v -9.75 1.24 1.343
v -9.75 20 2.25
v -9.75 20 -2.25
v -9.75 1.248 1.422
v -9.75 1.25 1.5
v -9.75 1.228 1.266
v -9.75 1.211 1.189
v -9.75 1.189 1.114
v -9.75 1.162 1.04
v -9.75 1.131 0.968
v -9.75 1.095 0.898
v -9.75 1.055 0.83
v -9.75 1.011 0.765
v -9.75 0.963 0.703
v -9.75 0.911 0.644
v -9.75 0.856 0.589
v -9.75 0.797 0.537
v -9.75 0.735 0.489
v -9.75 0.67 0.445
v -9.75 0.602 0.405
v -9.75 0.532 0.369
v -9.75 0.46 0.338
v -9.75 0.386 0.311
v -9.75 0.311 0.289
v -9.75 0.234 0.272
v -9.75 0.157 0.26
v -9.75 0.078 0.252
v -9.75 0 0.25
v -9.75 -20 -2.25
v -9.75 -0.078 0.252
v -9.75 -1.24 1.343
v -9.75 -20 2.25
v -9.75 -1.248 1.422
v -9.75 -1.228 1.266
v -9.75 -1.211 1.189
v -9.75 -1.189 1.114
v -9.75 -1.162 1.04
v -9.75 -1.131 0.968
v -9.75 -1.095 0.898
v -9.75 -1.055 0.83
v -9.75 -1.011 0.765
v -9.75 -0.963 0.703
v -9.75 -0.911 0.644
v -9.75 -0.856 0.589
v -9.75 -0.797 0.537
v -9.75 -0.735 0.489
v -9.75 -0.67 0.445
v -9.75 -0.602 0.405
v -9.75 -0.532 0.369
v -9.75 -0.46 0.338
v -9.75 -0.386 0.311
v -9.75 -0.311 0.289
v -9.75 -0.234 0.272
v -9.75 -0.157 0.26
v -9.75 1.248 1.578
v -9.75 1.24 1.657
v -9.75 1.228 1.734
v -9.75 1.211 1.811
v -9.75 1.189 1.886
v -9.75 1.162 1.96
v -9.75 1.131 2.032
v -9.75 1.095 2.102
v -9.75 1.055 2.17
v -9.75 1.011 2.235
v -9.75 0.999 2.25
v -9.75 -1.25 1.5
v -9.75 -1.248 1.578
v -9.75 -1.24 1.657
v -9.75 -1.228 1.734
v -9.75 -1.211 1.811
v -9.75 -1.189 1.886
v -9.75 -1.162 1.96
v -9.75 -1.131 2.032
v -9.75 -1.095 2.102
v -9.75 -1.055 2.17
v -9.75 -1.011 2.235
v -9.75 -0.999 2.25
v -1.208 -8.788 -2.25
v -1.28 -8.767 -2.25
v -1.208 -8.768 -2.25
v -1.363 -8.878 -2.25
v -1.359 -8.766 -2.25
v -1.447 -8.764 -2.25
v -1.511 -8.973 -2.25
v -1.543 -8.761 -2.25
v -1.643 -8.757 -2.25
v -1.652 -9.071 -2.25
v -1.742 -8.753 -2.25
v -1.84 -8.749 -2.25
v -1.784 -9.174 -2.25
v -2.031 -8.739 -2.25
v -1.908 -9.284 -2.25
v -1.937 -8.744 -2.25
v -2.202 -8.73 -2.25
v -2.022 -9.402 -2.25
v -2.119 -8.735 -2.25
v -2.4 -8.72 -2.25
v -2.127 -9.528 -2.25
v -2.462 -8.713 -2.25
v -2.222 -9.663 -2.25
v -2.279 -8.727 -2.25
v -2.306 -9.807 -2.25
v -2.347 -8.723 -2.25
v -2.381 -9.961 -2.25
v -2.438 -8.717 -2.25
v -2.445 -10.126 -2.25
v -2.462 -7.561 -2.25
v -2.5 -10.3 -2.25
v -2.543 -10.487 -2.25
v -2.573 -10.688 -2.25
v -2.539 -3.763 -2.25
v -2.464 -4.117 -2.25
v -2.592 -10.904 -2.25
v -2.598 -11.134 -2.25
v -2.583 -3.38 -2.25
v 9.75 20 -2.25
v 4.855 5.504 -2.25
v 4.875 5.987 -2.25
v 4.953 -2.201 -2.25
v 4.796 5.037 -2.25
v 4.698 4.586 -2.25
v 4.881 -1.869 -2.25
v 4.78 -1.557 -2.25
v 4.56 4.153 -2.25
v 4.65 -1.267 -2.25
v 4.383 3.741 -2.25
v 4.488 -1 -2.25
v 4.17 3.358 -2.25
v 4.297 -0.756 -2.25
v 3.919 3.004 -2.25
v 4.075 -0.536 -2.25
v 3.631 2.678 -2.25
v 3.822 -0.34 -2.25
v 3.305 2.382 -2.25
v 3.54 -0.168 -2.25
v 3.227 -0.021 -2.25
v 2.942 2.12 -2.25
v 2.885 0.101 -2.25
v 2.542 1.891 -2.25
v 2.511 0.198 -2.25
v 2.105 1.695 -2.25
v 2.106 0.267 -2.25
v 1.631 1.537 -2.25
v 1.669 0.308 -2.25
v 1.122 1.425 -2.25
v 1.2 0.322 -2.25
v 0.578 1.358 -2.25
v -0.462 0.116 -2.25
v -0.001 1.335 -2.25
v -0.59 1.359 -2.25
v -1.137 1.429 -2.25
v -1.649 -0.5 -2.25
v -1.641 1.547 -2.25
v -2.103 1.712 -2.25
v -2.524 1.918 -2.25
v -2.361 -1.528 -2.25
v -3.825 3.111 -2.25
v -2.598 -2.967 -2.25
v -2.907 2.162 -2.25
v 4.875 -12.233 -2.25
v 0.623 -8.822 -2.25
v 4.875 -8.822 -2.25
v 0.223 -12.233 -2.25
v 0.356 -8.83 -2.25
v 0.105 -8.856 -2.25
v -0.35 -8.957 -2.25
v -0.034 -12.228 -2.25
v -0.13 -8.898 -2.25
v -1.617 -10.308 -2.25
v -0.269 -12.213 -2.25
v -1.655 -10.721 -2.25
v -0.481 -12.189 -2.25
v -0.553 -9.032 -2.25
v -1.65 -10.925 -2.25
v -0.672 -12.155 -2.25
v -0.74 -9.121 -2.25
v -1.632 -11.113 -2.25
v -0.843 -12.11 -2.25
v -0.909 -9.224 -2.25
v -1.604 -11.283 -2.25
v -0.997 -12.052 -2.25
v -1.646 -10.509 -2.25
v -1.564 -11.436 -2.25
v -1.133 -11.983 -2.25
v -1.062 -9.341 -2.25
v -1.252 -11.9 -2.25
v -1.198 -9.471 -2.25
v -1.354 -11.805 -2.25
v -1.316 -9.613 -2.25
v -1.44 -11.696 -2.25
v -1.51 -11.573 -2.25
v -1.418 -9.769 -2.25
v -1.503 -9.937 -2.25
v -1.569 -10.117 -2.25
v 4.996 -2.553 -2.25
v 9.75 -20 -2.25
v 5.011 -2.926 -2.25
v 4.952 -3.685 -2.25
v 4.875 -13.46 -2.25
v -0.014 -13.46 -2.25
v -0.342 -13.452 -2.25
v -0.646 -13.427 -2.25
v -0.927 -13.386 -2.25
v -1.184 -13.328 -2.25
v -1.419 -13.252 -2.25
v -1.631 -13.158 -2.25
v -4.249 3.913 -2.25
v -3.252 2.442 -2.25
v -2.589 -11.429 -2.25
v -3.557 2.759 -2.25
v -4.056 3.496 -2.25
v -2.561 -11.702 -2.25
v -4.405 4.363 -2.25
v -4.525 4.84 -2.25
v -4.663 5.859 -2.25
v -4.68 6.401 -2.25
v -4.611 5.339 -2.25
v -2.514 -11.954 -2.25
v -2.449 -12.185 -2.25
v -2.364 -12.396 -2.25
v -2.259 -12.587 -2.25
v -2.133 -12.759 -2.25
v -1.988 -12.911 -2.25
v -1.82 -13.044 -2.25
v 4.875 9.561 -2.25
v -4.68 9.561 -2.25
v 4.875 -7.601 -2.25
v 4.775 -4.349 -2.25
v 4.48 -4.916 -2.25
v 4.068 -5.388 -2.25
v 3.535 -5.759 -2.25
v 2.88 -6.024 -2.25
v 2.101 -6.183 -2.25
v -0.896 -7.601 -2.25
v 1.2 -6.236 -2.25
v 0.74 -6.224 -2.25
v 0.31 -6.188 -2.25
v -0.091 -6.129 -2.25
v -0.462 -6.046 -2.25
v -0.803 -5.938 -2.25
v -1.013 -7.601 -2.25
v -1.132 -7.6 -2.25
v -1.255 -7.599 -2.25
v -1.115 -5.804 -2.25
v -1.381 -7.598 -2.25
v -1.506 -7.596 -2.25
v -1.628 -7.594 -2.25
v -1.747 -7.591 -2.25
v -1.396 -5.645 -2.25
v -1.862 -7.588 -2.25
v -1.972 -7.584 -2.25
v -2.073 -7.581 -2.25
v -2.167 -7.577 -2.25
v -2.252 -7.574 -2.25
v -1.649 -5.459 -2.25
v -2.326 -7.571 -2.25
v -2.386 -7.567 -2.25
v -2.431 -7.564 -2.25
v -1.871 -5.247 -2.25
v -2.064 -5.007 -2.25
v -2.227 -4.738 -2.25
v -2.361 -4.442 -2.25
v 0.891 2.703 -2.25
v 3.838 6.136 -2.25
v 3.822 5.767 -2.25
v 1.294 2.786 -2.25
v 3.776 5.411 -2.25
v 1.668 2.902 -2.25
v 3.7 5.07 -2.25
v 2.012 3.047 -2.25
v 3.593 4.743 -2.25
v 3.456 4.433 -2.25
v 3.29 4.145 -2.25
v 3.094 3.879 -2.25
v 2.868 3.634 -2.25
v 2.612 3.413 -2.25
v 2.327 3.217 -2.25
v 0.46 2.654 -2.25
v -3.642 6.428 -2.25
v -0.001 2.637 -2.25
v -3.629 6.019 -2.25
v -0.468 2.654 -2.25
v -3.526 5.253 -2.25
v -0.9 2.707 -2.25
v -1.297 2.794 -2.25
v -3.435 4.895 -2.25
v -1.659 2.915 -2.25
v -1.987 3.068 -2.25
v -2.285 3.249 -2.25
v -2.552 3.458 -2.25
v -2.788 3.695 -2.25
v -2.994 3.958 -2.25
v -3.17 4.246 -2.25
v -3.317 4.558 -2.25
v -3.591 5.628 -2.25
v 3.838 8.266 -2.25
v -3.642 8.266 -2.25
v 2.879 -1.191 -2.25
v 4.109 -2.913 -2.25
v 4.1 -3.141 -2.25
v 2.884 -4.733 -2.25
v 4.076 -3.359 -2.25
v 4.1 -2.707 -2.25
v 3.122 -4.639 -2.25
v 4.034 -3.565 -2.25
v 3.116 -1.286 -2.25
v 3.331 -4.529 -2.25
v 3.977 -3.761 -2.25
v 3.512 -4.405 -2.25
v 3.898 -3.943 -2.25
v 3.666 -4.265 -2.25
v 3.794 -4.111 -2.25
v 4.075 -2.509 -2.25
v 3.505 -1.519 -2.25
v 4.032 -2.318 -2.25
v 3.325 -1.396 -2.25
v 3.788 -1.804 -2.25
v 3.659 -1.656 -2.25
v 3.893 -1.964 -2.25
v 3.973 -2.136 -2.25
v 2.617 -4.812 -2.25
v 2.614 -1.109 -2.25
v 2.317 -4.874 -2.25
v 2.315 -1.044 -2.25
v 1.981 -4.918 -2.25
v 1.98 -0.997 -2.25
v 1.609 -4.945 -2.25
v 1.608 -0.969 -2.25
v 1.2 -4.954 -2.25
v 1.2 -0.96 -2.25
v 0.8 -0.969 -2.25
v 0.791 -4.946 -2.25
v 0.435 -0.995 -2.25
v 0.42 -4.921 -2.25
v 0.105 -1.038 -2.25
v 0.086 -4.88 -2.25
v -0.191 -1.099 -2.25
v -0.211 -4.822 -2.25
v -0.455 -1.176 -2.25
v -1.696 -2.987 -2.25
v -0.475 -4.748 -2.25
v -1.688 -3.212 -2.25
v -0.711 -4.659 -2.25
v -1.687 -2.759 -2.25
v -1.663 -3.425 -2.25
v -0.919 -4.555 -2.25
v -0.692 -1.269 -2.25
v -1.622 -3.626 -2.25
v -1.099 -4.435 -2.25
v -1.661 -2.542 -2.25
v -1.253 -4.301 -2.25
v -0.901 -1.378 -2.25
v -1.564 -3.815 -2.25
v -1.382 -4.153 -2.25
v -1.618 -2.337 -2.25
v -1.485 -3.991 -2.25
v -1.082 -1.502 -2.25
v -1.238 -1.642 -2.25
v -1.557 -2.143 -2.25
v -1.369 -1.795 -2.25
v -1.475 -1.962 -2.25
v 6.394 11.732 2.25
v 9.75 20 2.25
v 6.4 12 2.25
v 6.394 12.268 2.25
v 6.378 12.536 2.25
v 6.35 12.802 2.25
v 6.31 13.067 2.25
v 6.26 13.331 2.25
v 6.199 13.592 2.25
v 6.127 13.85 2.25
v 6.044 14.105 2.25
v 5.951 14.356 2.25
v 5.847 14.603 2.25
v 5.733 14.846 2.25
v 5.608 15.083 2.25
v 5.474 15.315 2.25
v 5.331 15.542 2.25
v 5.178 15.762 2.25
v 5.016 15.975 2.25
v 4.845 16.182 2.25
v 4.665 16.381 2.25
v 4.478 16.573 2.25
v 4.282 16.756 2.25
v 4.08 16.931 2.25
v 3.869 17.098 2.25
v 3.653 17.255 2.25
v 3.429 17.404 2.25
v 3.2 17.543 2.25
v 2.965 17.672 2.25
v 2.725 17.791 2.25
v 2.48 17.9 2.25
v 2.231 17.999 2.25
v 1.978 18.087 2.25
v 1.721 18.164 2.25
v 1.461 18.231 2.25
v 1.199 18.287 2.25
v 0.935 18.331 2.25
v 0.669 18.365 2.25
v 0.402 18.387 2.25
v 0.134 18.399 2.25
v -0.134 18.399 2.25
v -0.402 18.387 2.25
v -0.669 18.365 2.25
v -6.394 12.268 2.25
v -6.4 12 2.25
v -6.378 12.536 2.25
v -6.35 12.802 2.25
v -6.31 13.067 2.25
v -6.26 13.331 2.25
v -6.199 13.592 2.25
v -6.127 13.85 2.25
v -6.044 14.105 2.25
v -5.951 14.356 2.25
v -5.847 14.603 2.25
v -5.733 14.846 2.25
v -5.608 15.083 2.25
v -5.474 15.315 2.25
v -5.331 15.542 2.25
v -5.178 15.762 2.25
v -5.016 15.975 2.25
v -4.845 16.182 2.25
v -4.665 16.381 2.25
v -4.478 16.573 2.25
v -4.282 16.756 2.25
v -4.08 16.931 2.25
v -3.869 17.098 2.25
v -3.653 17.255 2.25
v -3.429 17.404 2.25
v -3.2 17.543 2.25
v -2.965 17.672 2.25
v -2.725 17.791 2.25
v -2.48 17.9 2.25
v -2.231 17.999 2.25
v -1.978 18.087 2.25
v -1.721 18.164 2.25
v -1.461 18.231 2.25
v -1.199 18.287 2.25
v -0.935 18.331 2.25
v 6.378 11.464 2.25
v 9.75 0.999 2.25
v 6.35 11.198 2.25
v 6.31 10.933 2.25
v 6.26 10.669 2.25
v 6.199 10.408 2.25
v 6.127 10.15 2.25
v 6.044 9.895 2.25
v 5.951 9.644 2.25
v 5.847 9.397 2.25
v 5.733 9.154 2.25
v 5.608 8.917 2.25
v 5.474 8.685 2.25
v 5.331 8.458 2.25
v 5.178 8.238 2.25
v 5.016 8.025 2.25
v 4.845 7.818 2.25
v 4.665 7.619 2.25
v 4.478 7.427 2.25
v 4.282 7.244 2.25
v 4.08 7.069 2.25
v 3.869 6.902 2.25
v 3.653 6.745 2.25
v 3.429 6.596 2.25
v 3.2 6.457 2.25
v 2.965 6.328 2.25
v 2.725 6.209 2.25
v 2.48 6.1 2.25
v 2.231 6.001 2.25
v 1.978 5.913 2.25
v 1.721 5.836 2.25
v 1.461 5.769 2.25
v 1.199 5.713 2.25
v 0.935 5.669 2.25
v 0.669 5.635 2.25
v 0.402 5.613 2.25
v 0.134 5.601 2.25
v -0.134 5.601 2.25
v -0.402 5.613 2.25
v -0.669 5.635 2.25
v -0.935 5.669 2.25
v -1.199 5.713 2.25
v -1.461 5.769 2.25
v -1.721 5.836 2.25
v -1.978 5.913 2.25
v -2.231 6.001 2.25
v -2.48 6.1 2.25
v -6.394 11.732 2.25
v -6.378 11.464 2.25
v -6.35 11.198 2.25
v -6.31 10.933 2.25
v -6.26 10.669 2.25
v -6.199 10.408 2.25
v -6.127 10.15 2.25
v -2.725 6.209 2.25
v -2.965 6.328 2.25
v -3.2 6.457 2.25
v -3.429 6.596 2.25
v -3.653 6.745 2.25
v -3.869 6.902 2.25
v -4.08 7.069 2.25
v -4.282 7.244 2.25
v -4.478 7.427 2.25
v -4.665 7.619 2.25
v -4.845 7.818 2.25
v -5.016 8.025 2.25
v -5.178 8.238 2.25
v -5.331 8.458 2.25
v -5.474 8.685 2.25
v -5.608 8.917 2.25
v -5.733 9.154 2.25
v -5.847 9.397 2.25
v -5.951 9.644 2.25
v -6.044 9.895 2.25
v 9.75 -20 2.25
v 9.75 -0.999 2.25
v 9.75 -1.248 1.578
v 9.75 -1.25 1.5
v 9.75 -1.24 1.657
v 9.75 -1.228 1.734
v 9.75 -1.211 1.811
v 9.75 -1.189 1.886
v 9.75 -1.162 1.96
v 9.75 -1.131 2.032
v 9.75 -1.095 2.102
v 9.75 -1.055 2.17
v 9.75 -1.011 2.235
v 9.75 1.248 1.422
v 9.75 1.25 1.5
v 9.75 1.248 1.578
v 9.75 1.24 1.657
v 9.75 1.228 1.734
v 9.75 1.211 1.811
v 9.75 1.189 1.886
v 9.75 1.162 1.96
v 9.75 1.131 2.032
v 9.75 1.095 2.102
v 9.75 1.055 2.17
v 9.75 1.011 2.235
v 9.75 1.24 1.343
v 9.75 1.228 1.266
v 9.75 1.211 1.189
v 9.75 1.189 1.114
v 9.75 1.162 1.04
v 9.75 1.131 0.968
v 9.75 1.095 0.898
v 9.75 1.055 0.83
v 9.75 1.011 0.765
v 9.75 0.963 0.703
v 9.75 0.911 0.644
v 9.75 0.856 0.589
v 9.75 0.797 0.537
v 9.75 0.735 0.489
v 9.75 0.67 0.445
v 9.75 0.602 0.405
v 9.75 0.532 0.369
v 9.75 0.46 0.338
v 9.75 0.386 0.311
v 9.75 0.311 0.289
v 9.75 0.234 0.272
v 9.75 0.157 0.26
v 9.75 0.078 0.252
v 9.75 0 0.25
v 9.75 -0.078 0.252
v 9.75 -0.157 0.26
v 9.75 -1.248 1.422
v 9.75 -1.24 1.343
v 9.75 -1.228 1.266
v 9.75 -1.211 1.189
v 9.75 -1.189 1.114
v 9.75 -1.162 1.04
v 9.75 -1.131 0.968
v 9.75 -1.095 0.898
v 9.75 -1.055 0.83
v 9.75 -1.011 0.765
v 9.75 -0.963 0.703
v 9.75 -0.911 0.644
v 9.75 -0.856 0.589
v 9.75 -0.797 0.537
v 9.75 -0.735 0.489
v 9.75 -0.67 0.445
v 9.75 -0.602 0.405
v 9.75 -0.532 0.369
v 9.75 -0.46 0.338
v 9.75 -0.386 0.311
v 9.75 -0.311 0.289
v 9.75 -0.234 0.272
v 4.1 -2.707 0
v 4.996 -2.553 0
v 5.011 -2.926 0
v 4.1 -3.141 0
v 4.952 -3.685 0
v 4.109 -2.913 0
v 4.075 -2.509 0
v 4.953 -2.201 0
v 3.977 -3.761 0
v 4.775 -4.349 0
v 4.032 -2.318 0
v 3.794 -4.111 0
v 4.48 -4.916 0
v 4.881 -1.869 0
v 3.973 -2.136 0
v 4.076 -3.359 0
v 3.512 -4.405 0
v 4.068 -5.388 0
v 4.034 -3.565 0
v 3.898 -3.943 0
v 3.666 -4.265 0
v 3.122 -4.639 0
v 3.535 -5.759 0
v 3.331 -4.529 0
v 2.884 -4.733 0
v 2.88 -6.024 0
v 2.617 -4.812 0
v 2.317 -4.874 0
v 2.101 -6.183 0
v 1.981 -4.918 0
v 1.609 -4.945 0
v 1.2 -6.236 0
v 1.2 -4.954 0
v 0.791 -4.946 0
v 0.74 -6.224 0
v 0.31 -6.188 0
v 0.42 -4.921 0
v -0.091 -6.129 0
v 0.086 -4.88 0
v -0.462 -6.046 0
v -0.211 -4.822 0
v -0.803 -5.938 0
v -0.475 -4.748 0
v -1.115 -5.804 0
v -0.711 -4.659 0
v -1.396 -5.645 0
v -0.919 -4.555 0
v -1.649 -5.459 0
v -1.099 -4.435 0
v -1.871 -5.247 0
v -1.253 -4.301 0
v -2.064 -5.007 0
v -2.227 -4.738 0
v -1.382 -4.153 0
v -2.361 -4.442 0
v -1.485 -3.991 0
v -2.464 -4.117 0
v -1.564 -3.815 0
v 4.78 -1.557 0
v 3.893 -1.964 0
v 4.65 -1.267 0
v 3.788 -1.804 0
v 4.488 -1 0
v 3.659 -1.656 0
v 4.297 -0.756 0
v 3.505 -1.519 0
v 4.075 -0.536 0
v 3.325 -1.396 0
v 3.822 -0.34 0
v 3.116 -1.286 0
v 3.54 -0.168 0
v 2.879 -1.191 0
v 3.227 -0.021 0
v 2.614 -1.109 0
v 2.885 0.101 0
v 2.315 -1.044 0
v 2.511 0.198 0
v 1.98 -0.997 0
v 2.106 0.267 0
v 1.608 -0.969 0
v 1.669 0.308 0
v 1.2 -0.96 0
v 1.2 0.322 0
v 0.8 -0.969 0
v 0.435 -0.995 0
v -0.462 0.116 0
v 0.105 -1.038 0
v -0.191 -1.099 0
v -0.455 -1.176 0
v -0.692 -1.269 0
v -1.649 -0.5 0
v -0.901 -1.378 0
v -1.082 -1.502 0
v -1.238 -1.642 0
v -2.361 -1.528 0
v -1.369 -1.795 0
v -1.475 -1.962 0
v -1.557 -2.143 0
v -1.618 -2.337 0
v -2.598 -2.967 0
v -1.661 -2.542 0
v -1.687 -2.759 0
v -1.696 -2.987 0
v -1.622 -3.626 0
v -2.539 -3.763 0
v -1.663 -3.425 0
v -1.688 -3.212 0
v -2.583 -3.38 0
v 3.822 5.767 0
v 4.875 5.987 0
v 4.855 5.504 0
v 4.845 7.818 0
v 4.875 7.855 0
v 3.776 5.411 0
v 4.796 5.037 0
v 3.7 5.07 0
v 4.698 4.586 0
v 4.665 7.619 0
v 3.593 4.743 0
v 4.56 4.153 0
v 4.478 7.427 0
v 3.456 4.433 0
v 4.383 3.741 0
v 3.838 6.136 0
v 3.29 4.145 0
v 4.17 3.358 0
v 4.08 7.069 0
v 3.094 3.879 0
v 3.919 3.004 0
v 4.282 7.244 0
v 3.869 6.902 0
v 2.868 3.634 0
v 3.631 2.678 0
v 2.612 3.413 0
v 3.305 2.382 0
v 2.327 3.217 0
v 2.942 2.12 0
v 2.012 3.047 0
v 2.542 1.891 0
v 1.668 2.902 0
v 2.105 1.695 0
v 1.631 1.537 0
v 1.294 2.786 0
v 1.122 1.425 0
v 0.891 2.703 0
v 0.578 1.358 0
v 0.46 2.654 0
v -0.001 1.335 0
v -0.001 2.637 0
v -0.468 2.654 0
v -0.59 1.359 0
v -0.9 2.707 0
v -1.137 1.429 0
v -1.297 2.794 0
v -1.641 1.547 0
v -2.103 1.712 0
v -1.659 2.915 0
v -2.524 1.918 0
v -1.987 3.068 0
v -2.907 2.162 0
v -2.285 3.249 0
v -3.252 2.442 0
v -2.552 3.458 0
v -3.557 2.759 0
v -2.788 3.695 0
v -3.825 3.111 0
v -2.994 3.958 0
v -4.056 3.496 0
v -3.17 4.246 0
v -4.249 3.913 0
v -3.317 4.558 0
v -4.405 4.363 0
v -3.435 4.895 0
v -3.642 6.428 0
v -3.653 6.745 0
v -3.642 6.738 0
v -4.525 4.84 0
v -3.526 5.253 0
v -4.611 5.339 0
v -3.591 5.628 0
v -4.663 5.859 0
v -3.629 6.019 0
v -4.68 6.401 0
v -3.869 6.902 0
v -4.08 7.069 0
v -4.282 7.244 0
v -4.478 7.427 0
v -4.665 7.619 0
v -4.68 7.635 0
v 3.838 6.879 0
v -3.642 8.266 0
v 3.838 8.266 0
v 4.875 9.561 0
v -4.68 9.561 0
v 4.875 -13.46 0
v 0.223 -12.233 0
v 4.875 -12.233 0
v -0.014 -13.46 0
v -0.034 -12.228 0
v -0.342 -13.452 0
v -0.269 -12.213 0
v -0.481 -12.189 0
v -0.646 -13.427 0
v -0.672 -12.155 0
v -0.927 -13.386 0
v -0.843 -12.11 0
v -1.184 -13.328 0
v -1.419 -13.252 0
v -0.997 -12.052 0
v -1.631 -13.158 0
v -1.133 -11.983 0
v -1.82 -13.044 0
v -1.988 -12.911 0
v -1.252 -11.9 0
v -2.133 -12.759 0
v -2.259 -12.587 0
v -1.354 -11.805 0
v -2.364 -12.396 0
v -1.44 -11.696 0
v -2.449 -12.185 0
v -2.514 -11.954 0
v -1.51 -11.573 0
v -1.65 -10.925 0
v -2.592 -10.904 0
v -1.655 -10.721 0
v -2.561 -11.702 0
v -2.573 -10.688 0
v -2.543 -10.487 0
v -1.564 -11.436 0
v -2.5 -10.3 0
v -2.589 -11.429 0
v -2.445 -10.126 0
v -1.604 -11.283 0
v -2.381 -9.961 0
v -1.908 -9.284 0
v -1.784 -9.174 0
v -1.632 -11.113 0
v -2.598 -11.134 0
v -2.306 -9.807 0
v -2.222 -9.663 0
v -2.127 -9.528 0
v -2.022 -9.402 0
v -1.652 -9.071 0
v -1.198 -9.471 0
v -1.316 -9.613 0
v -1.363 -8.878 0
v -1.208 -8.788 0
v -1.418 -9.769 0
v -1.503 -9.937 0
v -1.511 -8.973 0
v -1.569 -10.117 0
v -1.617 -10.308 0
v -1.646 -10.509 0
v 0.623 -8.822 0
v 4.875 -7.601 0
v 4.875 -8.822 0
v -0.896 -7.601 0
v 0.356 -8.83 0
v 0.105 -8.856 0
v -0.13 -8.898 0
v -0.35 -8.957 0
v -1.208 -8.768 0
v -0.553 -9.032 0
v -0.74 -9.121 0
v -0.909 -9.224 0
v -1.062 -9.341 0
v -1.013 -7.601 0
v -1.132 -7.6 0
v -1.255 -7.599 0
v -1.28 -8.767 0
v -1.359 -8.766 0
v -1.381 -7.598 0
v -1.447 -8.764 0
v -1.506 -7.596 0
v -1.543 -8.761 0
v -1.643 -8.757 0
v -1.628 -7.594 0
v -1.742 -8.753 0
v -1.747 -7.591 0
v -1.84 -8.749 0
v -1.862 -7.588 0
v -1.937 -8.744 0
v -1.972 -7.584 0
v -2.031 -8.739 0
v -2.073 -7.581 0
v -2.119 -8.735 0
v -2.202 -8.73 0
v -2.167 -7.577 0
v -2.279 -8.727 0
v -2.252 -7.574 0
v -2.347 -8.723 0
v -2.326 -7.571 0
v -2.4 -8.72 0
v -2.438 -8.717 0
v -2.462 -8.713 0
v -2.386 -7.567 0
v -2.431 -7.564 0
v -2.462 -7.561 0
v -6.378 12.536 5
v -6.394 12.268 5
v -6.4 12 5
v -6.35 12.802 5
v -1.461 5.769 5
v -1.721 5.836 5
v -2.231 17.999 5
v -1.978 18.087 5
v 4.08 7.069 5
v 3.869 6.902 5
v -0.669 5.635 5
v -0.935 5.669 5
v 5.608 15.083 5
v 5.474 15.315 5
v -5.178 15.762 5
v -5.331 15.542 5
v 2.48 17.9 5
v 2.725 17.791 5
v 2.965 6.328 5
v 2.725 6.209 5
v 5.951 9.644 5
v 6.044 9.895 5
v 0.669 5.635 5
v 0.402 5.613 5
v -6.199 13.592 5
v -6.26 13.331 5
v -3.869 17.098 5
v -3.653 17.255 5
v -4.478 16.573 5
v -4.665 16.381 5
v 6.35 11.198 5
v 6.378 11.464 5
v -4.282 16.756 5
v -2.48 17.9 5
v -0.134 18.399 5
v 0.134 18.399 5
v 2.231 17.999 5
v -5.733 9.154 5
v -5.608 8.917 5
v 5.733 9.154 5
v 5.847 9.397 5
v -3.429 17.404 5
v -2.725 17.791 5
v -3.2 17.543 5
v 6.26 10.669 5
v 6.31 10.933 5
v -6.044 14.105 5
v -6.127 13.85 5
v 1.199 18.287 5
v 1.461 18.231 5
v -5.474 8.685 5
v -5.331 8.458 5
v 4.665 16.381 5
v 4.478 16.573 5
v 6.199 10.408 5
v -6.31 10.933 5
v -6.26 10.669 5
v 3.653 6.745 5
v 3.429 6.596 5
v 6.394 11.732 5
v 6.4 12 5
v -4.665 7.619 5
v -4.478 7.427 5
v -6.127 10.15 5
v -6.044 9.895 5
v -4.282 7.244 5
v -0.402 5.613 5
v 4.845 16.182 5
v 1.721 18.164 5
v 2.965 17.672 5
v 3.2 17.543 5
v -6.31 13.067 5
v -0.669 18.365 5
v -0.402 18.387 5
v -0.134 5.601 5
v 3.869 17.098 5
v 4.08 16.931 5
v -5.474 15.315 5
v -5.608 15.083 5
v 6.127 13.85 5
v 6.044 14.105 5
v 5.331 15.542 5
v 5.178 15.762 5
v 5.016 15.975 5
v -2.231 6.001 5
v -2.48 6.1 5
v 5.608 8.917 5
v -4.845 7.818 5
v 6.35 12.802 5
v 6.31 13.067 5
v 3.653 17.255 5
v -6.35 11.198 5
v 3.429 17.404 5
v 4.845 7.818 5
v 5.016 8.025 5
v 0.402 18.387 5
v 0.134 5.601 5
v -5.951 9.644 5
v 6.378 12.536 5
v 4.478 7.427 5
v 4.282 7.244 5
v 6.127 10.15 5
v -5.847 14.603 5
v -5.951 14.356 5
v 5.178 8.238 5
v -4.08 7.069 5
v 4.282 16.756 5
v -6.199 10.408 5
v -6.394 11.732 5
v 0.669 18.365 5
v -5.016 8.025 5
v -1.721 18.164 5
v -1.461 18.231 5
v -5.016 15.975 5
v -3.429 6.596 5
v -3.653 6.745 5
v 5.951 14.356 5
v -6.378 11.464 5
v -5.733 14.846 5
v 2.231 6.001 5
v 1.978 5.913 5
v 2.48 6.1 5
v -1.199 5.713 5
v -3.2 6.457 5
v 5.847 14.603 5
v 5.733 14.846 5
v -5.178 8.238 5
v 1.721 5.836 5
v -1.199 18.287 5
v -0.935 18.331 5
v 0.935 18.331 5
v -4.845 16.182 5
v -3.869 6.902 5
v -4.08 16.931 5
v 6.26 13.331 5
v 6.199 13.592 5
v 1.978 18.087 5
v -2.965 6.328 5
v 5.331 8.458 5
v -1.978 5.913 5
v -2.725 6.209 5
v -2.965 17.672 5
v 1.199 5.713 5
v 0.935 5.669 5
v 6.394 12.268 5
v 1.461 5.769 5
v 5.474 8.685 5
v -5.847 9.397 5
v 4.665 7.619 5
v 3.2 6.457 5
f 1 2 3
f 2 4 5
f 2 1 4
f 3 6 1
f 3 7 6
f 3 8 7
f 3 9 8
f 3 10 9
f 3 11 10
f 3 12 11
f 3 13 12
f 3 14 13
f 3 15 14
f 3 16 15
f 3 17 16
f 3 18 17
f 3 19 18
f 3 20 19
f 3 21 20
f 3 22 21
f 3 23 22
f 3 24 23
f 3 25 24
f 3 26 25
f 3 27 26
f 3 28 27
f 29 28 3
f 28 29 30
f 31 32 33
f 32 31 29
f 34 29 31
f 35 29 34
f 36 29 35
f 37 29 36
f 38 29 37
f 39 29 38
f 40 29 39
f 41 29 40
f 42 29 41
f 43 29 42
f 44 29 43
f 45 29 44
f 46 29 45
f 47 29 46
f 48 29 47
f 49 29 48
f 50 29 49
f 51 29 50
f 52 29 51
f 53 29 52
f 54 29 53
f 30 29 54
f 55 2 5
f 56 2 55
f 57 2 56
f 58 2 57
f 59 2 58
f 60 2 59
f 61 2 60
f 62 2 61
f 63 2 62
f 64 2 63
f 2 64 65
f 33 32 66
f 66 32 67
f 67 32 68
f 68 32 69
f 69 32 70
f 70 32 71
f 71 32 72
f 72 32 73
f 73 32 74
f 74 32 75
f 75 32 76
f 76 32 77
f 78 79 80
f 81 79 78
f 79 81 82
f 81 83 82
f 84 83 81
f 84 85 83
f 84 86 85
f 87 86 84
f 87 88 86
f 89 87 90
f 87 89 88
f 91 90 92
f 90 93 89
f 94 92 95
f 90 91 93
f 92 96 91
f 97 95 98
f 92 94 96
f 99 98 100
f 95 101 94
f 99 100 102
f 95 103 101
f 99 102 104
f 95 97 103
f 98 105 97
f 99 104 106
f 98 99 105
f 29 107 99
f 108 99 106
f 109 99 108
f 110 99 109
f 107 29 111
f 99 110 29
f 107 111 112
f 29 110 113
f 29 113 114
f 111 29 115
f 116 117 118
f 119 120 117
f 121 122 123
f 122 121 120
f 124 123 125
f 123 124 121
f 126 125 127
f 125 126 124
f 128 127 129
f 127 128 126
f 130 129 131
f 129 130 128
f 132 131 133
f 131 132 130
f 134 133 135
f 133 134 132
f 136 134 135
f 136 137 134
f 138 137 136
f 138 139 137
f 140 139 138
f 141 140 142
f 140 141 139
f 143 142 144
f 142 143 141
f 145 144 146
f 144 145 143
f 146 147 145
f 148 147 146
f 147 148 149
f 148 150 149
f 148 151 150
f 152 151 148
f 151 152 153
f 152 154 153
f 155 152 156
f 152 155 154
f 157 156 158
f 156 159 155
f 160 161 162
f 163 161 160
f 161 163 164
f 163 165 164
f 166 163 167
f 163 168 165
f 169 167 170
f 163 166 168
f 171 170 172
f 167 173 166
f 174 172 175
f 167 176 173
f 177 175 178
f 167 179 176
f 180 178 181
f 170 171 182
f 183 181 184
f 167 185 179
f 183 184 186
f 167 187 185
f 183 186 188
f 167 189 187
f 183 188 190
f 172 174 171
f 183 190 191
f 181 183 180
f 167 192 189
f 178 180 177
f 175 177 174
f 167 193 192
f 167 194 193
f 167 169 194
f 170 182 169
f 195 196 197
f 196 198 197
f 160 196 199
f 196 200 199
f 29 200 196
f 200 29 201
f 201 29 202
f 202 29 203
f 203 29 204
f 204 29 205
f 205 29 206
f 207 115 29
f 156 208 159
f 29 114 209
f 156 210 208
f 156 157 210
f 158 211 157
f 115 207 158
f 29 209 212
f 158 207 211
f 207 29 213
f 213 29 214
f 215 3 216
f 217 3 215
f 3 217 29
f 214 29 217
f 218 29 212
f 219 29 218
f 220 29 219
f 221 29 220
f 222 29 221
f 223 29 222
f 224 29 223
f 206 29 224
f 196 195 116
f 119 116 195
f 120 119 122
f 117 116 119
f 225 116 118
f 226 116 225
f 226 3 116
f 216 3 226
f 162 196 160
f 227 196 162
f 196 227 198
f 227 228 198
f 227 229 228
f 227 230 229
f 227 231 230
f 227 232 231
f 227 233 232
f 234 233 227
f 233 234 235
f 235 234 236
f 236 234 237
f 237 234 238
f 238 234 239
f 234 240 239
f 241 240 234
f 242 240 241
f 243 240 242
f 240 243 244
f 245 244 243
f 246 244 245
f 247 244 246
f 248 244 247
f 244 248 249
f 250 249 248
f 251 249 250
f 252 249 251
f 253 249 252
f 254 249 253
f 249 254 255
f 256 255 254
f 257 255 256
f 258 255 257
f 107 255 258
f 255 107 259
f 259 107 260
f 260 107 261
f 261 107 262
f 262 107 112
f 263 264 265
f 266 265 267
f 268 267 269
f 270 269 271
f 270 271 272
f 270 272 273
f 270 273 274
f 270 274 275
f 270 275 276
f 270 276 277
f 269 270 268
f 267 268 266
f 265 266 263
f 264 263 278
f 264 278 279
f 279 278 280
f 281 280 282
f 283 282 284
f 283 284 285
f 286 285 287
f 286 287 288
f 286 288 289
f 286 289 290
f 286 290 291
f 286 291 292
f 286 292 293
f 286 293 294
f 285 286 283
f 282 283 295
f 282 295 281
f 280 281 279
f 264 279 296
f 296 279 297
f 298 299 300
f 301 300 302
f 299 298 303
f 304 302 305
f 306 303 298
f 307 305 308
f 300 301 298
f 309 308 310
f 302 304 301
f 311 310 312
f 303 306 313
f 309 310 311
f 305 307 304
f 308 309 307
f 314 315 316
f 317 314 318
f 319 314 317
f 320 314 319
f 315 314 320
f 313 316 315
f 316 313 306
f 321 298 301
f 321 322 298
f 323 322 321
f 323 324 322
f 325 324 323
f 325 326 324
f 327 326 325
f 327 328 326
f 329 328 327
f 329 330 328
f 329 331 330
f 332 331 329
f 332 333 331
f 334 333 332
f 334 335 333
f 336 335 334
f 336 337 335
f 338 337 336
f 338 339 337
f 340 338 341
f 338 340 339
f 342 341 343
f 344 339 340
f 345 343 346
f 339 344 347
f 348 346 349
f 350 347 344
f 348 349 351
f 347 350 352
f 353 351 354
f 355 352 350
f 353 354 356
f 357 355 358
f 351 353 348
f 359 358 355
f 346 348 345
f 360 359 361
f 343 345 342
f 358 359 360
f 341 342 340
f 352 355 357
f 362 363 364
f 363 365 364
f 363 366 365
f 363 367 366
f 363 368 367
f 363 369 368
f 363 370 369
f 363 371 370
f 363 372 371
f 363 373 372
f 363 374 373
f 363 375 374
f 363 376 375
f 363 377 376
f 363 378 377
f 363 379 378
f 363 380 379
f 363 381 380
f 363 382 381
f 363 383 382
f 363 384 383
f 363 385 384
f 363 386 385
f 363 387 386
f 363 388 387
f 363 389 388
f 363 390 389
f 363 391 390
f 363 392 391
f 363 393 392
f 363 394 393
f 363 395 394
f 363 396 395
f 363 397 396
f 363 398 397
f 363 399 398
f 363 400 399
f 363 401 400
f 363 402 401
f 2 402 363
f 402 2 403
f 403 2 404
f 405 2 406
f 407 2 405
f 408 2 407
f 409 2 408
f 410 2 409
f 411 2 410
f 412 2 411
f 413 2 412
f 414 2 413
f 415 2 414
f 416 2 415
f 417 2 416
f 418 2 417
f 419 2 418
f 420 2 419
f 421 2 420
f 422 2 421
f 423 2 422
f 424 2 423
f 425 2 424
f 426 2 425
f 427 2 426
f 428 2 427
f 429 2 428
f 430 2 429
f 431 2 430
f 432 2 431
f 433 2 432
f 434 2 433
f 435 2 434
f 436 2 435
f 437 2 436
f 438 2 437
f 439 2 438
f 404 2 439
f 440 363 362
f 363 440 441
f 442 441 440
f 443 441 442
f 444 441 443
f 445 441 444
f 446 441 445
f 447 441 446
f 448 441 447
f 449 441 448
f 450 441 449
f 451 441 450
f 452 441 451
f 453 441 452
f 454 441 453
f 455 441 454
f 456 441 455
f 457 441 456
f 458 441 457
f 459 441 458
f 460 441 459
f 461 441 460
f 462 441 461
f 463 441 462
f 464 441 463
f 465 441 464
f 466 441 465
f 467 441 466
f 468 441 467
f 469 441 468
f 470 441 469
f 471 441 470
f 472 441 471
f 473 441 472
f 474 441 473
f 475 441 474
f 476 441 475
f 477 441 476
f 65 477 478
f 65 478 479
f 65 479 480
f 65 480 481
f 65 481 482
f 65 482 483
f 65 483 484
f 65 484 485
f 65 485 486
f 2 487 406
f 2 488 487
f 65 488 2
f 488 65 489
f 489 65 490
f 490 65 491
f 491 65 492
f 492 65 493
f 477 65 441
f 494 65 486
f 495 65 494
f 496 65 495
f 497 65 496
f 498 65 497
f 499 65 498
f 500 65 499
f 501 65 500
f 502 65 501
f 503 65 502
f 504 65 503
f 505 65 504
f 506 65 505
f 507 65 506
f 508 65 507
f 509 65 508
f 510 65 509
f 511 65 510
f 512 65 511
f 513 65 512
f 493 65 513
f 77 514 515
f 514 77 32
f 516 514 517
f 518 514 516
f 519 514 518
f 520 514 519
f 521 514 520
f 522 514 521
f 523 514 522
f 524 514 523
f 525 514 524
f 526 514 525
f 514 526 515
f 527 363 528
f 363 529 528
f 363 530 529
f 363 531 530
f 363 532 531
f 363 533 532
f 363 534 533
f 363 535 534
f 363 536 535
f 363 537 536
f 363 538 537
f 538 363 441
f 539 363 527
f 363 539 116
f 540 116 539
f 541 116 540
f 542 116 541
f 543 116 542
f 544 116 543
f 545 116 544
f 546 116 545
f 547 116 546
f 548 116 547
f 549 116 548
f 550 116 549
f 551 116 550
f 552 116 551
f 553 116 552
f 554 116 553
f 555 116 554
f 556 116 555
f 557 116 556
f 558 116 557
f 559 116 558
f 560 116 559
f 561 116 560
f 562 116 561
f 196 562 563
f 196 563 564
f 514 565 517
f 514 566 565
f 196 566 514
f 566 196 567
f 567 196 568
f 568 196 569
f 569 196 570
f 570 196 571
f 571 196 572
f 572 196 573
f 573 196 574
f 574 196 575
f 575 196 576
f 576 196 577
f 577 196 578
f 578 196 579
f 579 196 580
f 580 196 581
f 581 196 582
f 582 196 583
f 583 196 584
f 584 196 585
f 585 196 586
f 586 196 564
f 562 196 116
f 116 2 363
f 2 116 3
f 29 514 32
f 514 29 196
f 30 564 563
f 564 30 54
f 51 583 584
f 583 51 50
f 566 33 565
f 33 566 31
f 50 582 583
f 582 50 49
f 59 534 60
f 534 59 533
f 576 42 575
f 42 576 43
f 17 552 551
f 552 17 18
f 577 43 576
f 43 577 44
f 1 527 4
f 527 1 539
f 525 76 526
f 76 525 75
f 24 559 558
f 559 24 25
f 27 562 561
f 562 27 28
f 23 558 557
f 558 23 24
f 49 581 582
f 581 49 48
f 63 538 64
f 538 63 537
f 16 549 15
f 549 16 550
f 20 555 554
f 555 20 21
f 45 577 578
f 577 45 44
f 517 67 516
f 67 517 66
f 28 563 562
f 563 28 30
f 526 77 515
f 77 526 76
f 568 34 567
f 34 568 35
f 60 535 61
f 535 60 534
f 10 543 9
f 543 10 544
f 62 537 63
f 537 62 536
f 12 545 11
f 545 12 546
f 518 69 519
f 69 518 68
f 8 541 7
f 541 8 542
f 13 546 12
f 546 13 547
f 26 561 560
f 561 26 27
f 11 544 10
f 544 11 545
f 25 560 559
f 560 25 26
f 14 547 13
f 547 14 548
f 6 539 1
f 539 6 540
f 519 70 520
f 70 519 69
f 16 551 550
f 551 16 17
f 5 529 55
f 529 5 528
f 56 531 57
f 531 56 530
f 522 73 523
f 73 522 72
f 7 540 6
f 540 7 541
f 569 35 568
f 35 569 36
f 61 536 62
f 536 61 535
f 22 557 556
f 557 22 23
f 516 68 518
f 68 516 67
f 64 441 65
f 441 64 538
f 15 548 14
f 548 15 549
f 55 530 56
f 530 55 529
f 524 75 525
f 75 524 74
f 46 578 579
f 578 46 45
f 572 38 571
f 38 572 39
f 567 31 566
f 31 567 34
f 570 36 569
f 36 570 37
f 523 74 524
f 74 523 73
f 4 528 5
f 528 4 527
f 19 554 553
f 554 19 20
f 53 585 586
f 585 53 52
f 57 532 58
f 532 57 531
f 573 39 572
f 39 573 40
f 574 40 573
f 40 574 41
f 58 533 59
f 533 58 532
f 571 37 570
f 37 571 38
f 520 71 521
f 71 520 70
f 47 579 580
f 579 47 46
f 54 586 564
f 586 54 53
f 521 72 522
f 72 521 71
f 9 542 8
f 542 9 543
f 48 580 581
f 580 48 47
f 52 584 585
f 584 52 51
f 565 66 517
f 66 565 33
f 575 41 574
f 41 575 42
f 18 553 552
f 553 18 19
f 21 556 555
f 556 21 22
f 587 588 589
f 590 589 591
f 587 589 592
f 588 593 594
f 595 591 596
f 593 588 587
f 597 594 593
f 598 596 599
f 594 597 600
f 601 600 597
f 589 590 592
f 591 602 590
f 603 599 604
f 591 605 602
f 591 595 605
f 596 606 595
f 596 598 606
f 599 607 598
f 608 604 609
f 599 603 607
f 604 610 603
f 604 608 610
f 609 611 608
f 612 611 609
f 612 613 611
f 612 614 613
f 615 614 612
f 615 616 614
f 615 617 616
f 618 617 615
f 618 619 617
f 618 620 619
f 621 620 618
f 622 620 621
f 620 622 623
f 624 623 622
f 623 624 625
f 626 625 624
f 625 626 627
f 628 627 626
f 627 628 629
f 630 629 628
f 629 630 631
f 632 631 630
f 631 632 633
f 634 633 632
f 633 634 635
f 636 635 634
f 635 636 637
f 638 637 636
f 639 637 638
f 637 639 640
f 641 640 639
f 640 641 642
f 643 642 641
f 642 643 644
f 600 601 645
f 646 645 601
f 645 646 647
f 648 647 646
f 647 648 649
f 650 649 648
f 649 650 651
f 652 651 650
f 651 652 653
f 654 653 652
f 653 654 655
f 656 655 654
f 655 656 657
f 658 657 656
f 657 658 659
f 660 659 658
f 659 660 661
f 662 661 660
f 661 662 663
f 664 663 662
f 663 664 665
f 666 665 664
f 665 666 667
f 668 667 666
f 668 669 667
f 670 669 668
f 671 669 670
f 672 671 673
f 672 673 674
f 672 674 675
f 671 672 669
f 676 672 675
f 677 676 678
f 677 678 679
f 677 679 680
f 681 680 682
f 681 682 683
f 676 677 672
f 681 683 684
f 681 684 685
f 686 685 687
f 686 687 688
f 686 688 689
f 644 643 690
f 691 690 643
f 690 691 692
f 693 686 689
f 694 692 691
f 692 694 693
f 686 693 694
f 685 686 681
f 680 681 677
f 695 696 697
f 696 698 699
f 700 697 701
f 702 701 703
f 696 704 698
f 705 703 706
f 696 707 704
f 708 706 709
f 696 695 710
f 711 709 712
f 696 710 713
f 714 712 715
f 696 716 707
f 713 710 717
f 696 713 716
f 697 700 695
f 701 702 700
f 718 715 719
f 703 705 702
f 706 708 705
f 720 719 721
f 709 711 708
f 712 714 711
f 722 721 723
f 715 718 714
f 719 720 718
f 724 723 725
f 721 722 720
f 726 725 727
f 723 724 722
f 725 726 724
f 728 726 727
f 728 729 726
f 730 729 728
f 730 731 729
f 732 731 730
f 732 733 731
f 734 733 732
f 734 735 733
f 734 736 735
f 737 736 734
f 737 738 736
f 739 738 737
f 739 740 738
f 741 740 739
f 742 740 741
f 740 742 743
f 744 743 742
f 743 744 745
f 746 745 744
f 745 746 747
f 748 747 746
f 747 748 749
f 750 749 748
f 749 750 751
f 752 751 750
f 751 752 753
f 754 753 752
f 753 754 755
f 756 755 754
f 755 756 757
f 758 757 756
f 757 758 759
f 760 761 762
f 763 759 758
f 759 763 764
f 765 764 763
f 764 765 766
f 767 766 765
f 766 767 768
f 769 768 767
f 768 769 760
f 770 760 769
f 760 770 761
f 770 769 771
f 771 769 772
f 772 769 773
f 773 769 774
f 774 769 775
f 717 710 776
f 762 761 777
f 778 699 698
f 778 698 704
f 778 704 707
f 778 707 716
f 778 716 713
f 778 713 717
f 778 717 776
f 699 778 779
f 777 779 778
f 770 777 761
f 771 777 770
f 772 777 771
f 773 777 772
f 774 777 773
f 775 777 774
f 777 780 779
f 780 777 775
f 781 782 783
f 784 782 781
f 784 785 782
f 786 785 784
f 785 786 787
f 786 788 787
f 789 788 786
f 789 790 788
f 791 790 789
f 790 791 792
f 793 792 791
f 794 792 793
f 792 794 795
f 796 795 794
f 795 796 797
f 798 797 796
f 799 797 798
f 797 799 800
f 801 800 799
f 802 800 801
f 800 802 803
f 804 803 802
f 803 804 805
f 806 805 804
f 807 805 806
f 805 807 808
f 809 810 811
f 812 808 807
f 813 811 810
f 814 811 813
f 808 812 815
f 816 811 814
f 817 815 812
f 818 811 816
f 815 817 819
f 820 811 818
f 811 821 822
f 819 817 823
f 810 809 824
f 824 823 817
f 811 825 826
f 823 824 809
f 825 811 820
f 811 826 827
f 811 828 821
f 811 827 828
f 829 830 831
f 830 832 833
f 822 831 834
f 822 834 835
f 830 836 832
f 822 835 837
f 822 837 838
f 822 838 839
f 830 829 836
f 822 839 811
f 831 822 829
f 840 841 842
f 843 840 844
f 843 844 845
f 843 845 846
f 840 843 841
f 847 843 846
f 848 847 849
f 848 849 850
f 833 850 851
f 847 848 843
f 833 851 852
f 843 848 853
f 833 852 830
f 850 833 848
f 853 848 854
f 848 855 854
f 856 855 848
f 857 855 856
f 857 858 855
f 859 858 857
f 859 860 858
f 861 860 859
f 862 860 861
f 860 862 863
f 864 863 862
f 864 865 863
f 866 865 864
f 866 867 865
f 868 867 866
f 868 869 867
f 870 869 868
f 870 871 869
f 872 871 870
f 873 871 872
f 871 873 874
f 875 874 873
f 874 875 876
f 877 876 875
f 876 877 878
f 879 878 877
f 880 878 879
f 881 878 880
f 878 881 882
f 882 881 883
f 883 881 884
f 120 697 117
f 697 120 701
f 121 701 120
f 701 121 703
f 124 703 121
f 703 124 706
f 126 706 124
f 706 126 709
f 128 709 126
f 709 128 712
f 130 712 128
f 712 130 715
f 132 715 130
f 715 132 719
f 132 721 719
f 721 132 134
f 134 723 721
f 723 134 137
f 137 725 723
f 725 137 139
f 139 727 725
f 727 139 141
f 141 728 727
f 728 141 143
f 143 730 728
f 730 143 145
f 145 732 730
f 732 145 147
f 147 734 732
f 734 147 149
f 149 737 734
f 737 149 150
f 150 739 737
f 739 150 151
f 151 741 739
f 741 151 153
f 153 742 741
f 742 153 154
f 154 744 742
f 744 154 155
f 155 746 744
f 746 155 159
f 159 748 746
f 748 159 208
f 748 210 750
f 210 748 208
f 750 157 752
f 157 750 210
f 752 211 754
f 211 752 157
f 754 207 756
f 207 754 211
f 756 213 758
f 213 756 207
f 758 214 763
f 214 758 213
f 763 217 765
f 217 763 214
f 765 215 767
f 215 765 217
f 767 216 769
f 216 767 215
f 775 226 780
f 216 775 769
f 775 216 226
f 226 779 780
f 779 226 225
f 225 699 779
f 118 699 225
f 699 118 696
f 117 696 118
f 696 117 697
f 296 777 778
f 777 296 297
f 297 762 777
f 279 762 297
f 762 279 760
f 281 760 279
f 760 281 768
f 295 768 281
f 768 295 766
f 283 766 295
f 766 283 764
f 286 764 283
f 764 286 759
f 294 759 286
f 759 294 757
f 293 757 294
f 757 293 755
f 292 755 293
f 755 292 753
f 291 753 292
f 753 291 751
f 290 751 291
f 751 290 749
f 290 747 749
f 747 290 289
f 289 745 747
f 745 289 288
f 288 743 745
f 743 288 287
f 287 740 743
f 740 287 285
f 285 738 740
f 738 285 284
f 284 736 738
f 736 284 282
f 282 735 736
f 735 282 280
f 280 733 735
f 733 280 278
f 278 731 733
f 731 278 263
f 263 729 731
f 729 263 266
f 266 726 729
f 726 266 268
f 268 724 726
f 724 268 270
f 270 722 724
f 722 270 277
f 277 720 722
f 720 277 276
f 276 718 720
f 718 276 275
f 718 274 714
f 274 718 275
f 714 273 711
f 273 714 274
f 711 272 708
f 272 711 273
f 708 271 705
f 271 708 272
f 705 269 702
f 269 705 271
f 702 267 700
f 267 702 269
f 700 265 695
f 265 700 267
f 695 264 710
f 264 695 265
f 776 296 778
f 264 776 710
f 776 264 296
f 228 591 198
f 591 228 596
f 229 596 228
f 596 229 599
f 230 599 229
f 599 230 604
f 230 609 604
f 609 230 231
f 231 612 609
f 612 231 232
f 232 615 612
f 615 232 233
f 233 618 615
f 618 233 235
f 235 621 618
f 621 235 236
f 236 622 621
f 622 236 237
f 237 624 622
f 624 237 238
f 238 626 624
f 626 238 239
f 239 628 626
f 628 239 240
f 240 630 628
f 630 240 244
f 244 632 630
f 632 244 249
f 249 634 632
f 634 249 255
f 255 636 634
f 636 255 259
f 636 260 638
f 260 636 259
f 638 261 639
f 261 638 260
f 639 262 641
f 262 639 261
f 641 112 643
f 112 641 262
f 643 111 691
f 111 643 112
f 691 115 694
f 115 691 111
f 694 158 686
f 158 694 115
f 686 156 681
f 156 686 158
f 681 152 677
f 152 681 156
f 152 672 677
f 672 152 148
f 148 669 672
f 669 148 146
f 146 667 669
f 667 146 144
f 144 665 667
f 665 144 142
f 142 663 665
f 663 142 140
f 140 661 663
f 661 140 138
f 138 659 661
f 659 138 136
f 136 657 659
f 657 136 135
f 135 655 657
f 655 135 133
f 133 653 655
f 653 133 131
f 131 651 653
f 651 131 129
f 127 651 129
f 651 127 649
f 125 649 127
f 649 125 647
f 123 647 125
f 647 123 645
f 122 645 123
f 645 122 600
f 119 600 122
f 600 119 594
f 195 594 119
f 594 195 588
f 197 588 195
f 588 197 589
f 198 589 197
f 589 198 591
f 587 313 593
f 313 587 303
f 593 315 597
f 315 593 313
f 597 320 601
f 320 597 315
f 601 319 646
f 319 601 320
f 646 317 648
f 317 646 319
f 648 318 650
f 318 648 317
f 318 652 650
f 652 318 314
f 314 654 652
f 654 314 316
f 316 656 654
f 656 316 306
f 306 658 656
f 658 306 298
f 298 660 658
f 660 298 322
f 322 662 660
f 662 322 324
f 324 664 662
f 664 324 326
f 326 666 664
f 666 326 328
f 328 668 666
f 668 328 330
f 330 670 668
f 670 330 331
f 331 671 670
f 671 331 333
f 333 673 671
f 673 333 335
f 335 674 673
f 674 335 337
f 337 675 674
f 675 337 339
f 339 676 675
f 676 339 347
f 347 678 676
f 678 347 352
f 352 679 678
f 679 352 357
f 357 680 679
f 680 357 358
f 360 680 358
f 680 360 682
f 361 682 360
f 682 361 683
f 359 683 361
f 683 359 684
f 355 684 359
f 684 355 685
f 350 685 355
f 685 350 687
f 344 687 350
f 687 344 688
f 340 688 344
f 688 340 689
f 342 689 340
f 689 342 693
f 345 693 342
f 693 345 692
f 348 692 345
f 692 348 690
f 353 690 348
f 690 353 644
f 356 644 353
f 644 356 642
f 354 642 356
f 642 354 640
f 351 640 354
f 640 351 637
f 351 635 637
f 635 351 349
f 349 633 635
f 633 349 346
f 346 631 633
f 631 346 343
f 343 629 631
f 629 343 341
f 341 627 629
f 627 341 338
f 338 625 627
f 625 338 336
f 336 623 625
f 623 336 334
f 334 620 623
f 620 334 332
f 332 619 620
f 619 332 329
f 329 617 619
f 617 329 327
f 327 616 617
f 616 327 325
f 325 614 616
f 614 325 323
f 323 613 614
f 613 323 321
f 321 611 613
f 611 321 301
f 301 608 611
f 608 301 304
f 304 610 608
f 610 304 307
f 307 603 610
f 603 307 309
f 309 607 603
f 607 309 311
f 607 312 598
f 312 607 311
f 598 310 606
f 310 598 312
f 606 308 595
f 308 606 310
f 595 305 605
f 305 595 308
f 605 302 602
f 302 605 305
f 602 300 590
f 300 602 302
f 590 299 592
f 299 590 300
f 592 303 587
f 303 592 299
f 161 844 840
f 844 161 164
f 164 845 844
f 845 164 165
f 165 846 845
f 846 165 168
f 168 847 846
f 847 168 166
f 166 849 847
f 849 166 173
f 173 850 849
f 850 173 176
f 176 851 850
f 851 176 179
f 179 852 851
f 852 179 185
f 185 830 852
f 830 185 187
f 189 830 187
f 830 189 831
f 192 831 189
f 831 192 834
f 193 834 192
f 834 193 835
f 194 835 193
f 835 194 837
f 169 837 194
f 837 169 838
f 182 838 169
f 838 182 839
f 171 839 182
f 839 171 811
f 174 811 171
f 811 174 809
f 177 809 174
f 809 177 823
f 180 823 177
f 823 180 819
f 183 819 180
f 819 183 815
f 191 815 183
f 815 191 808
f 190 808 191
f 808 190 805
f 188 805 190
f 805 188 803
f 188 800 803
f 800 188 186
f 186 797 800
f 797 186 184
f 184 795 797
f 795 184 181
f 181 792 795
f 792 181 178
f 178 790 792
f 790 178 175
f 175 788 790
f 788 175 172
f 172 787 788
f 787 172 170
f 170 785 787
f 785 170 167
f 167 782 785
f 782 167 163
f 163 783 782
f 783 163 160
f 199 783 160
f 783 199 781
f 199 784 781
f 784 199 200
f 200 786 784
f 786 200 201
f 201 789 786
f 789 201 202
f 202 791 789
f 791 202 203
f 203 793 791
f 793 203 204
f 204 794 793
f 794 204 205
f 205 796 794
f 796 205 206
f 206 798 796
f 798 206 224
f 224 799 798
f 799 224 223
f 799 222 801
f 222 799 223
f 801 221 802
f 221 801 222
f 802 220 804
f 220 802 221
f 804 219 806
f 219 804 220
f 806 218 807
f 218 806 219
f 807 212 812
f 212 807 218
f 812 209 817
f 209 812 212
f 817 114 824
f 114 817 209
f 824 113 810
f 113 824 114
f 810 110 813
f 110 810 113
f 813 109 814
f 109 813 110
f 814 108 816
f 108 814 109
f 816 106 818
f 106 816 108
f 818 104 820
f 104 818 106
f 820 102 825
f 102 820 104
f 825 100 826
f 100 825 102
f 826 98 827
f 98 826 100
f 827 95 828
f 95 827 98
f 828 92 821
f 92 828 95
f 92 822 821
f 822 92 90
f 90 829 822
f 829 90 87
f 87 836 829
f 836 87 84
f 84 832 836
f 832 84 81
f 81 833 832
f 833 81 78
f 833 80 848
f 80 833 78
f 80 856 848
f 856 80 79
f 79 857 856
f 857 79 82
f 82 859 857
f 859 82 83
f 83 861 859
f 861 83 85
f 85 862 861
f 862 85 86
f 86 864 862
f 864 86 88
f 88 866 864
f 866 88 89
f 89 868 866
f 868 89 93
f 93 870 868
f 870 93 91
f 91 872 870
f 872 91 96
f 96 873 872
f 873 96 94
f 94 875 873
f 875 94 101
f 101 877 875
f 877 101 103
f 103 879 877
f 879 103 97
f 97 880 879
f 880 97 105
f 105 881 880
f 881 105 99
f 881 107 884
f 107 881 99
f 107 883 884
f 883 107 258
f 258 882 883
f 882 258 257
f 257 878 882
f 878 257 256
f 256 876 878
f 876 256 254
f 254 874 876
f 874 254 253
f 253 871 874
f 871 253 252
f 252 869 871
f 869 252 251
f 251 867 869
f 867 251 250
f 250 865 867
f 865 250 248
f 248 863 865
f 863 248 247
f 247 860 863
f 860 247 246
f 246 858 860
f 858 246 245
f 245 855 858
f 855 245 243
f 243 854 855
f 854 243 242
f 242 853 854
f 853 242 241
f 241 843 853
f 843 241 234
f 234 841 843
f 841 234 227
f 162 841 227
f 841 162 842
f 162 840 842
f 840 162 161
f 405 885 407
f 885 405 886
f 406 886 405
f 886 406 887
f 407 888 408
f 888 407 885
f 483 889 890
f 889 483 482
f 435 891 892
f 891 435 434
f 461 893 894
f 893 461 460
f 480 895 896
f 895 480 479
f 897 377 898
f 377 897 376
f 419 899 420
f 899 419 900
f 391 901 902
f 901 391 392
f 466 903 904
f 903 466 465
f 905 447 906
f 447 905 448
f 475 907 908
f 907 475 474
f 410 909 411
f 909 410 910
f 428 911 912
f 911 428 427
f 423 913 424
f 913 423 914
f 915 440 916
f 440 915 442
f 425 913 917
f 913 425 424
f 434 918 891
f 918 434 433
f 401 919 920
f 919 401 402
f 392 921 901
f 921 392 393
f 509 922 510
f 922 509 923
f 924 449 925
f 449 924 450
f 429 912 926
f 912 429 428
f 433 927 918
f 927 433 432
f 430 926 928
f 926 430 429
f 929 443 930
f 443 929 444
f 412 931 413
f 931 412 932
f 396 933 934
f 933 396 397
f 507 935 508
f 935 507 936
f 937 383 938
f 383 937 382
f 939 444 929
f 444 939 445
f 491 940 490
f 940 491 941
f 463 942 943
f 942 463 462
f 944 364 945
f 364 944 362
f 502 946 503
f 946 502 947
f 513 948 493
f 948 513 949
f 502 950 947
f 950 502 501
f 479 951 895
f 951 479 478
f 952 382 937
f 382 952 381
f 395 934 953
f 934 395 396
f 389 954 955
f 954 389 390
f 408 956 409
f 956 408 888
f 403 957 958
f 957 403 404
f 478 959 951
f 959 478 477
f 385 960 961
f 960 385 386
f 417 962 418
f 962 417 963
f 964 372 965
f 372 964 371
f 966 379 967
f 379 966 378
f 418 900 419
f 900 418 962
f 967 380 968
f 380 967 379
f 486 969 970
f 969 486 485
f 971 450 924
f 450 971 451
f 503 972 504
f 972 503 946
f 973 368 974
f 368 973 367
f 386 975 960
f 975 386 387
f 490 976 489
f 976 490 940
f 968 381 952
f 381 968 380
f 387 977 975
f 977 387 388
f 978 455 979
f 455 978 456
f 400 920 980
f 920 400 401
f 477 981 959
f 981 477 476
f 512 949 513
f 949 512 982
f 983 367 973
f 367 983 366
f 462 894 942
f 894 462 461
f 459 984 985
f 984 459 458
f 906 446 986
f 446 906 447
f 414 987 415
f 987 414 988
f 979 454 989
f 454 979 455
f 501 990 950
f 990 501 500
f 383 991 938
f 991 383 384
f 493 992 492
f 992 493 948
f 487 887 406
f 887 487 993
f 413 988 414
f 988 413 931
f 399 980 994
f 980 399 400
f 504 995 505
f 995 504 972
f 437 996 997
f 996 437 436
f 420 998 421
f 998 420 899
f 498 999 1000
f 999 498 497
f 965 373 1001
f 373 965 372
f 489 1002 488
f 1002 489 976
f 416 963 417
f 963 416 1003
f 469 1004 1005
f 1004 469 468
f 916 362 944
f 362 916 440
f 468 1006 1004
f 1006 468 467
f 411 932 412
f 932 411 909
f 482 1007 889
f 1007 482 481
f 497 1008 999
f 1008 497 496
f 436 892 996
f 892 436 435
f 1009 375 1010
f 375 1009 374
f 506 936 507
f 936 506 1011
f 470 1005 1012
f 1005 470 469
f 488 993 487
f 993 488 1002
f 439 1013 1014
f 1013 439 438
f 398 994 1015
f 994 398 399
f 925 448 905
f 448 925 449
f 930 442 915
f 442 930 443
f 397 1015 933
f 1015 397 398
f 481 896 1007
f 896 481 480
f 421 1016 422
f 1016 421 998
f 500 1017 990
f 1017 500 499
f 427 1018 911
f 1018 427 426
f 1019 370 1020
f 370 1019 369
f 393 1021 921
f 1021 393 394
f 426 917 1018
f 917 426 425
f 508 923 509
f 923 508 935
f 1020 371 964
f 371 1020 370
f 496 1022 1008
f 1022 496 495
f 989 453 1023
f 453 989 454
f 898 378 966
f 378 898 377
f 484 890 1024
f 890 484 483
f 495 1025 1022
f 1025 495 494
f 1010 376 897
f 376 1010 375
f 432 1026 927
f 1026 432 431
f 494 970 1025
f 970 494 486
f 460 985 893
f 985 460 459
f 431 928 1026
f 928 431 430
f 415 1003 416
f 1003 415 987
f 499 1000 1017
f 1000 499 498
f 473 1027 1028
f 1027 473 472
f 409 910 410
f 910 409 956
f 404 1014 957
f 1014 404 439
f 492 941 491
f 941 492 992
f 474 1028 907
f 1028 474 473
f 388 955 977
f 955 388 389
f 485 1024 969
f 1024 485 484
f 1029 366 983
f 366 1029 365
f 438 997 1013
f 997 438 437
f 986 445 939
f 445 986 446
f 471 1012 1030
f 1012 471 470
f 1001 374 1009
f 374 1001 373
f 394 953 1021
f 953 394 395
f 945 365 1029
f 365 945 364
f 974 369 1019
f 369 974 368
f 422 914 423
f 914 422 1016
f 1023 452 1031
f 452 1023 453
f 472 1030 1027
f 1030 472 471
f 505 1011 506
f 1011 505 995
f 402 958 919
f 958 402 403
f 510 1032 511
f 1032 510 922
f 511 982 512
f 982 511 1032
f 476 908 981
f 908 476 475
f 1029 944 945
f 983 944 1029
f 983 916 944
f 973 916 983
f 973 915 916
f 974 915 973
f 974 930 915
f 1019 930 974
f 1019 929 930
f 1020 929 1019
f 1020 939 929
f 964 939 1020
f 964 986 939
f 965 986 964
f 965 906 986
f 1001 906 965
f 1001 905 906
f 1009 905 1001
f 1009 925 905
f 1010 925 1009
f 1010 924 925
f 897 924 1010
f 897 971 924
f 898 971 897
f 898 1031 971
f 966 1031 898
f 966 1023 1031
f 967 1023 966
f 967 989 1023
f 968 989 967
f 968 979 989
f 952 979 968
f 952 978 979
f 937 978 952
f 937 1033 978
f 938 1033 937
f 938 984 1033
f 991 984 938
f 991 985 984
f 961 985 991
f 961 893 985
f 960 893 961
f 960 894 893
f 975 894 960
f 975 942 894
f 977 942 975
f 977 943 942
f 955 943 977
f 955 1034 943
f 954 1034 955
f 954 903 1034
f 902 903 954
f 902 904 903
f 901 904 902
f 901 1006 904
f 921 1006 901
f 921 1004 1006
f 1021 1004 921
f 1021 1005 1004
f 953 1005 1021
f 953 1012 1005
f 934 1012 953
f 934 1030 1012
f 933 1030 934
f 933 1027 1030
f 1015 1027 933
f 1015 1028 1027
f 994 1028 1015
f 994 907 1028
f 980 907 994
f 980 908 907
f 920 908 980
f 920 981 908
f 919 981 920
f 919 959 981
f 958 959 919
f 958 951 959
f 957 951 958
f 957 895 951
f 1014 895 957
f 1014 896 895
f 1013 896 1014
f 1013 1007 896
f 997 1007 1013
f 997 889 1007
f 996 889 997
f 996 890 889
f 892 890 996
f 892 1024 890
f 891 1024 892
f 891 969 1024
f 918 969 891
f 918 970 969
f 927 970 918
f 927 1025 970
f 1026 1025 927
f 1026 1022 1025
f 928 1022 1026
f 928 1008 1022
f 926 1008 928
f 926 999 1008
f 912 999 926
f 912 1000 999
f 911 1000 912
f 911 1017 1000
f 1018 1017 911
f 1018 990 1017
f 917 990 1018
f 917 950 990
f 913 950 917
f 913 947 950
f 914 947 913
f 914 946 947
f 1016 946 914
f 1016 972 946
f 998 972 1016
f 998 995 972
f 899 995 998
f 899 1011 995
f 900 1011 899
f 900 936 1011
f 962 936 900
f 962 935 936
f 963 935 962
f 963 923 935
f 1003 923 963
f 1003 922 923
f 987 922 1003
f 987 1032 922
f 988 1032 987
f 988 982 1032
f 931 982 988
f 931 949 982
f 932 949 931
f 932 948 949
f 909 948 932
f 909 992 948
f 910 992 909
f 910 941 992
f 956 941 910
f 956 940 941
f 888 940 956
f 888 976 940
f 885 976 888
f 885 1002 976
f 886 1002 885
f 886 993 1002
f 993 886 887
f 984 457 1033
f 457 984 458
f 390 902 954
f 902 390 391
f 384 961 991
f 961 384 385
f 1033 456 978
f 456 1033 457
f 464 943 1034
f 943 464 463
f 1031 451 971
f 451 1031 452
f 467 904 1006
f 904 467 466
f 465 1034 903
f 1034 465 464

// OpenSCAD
// Copyright 2018 Don Bowman <db@donbowman.ca>
// Released under Apache 2.0 License
rotate([0,180,0])
{
  translate([0,12,-5])

  cylinder(d=12.8, h=5, $fn=150);

  difference()
  {
    cube([19.5, 40.0,4.5],center=true);

    translate([-12,0,-1.5])
    rotate([0,90,0])
    cylinder(d=2.5,h=25, $fn=100);

    translate([8,-11,2])
    mirror([0,0,0])
    rotate([0,0,90])
    scale([1.7,1.7,1])
    linear_extrude(height = 1, center = true, convexity = 10, twist = 0);

    // Remove these 4-lines to de-brand
    // (Or put your own name on!)
    rotate([0,0,-90])
    translate([-42.8/4,-19.5/4,0])
    linear_extrude(2.25)
    text("Don");
  }
}
